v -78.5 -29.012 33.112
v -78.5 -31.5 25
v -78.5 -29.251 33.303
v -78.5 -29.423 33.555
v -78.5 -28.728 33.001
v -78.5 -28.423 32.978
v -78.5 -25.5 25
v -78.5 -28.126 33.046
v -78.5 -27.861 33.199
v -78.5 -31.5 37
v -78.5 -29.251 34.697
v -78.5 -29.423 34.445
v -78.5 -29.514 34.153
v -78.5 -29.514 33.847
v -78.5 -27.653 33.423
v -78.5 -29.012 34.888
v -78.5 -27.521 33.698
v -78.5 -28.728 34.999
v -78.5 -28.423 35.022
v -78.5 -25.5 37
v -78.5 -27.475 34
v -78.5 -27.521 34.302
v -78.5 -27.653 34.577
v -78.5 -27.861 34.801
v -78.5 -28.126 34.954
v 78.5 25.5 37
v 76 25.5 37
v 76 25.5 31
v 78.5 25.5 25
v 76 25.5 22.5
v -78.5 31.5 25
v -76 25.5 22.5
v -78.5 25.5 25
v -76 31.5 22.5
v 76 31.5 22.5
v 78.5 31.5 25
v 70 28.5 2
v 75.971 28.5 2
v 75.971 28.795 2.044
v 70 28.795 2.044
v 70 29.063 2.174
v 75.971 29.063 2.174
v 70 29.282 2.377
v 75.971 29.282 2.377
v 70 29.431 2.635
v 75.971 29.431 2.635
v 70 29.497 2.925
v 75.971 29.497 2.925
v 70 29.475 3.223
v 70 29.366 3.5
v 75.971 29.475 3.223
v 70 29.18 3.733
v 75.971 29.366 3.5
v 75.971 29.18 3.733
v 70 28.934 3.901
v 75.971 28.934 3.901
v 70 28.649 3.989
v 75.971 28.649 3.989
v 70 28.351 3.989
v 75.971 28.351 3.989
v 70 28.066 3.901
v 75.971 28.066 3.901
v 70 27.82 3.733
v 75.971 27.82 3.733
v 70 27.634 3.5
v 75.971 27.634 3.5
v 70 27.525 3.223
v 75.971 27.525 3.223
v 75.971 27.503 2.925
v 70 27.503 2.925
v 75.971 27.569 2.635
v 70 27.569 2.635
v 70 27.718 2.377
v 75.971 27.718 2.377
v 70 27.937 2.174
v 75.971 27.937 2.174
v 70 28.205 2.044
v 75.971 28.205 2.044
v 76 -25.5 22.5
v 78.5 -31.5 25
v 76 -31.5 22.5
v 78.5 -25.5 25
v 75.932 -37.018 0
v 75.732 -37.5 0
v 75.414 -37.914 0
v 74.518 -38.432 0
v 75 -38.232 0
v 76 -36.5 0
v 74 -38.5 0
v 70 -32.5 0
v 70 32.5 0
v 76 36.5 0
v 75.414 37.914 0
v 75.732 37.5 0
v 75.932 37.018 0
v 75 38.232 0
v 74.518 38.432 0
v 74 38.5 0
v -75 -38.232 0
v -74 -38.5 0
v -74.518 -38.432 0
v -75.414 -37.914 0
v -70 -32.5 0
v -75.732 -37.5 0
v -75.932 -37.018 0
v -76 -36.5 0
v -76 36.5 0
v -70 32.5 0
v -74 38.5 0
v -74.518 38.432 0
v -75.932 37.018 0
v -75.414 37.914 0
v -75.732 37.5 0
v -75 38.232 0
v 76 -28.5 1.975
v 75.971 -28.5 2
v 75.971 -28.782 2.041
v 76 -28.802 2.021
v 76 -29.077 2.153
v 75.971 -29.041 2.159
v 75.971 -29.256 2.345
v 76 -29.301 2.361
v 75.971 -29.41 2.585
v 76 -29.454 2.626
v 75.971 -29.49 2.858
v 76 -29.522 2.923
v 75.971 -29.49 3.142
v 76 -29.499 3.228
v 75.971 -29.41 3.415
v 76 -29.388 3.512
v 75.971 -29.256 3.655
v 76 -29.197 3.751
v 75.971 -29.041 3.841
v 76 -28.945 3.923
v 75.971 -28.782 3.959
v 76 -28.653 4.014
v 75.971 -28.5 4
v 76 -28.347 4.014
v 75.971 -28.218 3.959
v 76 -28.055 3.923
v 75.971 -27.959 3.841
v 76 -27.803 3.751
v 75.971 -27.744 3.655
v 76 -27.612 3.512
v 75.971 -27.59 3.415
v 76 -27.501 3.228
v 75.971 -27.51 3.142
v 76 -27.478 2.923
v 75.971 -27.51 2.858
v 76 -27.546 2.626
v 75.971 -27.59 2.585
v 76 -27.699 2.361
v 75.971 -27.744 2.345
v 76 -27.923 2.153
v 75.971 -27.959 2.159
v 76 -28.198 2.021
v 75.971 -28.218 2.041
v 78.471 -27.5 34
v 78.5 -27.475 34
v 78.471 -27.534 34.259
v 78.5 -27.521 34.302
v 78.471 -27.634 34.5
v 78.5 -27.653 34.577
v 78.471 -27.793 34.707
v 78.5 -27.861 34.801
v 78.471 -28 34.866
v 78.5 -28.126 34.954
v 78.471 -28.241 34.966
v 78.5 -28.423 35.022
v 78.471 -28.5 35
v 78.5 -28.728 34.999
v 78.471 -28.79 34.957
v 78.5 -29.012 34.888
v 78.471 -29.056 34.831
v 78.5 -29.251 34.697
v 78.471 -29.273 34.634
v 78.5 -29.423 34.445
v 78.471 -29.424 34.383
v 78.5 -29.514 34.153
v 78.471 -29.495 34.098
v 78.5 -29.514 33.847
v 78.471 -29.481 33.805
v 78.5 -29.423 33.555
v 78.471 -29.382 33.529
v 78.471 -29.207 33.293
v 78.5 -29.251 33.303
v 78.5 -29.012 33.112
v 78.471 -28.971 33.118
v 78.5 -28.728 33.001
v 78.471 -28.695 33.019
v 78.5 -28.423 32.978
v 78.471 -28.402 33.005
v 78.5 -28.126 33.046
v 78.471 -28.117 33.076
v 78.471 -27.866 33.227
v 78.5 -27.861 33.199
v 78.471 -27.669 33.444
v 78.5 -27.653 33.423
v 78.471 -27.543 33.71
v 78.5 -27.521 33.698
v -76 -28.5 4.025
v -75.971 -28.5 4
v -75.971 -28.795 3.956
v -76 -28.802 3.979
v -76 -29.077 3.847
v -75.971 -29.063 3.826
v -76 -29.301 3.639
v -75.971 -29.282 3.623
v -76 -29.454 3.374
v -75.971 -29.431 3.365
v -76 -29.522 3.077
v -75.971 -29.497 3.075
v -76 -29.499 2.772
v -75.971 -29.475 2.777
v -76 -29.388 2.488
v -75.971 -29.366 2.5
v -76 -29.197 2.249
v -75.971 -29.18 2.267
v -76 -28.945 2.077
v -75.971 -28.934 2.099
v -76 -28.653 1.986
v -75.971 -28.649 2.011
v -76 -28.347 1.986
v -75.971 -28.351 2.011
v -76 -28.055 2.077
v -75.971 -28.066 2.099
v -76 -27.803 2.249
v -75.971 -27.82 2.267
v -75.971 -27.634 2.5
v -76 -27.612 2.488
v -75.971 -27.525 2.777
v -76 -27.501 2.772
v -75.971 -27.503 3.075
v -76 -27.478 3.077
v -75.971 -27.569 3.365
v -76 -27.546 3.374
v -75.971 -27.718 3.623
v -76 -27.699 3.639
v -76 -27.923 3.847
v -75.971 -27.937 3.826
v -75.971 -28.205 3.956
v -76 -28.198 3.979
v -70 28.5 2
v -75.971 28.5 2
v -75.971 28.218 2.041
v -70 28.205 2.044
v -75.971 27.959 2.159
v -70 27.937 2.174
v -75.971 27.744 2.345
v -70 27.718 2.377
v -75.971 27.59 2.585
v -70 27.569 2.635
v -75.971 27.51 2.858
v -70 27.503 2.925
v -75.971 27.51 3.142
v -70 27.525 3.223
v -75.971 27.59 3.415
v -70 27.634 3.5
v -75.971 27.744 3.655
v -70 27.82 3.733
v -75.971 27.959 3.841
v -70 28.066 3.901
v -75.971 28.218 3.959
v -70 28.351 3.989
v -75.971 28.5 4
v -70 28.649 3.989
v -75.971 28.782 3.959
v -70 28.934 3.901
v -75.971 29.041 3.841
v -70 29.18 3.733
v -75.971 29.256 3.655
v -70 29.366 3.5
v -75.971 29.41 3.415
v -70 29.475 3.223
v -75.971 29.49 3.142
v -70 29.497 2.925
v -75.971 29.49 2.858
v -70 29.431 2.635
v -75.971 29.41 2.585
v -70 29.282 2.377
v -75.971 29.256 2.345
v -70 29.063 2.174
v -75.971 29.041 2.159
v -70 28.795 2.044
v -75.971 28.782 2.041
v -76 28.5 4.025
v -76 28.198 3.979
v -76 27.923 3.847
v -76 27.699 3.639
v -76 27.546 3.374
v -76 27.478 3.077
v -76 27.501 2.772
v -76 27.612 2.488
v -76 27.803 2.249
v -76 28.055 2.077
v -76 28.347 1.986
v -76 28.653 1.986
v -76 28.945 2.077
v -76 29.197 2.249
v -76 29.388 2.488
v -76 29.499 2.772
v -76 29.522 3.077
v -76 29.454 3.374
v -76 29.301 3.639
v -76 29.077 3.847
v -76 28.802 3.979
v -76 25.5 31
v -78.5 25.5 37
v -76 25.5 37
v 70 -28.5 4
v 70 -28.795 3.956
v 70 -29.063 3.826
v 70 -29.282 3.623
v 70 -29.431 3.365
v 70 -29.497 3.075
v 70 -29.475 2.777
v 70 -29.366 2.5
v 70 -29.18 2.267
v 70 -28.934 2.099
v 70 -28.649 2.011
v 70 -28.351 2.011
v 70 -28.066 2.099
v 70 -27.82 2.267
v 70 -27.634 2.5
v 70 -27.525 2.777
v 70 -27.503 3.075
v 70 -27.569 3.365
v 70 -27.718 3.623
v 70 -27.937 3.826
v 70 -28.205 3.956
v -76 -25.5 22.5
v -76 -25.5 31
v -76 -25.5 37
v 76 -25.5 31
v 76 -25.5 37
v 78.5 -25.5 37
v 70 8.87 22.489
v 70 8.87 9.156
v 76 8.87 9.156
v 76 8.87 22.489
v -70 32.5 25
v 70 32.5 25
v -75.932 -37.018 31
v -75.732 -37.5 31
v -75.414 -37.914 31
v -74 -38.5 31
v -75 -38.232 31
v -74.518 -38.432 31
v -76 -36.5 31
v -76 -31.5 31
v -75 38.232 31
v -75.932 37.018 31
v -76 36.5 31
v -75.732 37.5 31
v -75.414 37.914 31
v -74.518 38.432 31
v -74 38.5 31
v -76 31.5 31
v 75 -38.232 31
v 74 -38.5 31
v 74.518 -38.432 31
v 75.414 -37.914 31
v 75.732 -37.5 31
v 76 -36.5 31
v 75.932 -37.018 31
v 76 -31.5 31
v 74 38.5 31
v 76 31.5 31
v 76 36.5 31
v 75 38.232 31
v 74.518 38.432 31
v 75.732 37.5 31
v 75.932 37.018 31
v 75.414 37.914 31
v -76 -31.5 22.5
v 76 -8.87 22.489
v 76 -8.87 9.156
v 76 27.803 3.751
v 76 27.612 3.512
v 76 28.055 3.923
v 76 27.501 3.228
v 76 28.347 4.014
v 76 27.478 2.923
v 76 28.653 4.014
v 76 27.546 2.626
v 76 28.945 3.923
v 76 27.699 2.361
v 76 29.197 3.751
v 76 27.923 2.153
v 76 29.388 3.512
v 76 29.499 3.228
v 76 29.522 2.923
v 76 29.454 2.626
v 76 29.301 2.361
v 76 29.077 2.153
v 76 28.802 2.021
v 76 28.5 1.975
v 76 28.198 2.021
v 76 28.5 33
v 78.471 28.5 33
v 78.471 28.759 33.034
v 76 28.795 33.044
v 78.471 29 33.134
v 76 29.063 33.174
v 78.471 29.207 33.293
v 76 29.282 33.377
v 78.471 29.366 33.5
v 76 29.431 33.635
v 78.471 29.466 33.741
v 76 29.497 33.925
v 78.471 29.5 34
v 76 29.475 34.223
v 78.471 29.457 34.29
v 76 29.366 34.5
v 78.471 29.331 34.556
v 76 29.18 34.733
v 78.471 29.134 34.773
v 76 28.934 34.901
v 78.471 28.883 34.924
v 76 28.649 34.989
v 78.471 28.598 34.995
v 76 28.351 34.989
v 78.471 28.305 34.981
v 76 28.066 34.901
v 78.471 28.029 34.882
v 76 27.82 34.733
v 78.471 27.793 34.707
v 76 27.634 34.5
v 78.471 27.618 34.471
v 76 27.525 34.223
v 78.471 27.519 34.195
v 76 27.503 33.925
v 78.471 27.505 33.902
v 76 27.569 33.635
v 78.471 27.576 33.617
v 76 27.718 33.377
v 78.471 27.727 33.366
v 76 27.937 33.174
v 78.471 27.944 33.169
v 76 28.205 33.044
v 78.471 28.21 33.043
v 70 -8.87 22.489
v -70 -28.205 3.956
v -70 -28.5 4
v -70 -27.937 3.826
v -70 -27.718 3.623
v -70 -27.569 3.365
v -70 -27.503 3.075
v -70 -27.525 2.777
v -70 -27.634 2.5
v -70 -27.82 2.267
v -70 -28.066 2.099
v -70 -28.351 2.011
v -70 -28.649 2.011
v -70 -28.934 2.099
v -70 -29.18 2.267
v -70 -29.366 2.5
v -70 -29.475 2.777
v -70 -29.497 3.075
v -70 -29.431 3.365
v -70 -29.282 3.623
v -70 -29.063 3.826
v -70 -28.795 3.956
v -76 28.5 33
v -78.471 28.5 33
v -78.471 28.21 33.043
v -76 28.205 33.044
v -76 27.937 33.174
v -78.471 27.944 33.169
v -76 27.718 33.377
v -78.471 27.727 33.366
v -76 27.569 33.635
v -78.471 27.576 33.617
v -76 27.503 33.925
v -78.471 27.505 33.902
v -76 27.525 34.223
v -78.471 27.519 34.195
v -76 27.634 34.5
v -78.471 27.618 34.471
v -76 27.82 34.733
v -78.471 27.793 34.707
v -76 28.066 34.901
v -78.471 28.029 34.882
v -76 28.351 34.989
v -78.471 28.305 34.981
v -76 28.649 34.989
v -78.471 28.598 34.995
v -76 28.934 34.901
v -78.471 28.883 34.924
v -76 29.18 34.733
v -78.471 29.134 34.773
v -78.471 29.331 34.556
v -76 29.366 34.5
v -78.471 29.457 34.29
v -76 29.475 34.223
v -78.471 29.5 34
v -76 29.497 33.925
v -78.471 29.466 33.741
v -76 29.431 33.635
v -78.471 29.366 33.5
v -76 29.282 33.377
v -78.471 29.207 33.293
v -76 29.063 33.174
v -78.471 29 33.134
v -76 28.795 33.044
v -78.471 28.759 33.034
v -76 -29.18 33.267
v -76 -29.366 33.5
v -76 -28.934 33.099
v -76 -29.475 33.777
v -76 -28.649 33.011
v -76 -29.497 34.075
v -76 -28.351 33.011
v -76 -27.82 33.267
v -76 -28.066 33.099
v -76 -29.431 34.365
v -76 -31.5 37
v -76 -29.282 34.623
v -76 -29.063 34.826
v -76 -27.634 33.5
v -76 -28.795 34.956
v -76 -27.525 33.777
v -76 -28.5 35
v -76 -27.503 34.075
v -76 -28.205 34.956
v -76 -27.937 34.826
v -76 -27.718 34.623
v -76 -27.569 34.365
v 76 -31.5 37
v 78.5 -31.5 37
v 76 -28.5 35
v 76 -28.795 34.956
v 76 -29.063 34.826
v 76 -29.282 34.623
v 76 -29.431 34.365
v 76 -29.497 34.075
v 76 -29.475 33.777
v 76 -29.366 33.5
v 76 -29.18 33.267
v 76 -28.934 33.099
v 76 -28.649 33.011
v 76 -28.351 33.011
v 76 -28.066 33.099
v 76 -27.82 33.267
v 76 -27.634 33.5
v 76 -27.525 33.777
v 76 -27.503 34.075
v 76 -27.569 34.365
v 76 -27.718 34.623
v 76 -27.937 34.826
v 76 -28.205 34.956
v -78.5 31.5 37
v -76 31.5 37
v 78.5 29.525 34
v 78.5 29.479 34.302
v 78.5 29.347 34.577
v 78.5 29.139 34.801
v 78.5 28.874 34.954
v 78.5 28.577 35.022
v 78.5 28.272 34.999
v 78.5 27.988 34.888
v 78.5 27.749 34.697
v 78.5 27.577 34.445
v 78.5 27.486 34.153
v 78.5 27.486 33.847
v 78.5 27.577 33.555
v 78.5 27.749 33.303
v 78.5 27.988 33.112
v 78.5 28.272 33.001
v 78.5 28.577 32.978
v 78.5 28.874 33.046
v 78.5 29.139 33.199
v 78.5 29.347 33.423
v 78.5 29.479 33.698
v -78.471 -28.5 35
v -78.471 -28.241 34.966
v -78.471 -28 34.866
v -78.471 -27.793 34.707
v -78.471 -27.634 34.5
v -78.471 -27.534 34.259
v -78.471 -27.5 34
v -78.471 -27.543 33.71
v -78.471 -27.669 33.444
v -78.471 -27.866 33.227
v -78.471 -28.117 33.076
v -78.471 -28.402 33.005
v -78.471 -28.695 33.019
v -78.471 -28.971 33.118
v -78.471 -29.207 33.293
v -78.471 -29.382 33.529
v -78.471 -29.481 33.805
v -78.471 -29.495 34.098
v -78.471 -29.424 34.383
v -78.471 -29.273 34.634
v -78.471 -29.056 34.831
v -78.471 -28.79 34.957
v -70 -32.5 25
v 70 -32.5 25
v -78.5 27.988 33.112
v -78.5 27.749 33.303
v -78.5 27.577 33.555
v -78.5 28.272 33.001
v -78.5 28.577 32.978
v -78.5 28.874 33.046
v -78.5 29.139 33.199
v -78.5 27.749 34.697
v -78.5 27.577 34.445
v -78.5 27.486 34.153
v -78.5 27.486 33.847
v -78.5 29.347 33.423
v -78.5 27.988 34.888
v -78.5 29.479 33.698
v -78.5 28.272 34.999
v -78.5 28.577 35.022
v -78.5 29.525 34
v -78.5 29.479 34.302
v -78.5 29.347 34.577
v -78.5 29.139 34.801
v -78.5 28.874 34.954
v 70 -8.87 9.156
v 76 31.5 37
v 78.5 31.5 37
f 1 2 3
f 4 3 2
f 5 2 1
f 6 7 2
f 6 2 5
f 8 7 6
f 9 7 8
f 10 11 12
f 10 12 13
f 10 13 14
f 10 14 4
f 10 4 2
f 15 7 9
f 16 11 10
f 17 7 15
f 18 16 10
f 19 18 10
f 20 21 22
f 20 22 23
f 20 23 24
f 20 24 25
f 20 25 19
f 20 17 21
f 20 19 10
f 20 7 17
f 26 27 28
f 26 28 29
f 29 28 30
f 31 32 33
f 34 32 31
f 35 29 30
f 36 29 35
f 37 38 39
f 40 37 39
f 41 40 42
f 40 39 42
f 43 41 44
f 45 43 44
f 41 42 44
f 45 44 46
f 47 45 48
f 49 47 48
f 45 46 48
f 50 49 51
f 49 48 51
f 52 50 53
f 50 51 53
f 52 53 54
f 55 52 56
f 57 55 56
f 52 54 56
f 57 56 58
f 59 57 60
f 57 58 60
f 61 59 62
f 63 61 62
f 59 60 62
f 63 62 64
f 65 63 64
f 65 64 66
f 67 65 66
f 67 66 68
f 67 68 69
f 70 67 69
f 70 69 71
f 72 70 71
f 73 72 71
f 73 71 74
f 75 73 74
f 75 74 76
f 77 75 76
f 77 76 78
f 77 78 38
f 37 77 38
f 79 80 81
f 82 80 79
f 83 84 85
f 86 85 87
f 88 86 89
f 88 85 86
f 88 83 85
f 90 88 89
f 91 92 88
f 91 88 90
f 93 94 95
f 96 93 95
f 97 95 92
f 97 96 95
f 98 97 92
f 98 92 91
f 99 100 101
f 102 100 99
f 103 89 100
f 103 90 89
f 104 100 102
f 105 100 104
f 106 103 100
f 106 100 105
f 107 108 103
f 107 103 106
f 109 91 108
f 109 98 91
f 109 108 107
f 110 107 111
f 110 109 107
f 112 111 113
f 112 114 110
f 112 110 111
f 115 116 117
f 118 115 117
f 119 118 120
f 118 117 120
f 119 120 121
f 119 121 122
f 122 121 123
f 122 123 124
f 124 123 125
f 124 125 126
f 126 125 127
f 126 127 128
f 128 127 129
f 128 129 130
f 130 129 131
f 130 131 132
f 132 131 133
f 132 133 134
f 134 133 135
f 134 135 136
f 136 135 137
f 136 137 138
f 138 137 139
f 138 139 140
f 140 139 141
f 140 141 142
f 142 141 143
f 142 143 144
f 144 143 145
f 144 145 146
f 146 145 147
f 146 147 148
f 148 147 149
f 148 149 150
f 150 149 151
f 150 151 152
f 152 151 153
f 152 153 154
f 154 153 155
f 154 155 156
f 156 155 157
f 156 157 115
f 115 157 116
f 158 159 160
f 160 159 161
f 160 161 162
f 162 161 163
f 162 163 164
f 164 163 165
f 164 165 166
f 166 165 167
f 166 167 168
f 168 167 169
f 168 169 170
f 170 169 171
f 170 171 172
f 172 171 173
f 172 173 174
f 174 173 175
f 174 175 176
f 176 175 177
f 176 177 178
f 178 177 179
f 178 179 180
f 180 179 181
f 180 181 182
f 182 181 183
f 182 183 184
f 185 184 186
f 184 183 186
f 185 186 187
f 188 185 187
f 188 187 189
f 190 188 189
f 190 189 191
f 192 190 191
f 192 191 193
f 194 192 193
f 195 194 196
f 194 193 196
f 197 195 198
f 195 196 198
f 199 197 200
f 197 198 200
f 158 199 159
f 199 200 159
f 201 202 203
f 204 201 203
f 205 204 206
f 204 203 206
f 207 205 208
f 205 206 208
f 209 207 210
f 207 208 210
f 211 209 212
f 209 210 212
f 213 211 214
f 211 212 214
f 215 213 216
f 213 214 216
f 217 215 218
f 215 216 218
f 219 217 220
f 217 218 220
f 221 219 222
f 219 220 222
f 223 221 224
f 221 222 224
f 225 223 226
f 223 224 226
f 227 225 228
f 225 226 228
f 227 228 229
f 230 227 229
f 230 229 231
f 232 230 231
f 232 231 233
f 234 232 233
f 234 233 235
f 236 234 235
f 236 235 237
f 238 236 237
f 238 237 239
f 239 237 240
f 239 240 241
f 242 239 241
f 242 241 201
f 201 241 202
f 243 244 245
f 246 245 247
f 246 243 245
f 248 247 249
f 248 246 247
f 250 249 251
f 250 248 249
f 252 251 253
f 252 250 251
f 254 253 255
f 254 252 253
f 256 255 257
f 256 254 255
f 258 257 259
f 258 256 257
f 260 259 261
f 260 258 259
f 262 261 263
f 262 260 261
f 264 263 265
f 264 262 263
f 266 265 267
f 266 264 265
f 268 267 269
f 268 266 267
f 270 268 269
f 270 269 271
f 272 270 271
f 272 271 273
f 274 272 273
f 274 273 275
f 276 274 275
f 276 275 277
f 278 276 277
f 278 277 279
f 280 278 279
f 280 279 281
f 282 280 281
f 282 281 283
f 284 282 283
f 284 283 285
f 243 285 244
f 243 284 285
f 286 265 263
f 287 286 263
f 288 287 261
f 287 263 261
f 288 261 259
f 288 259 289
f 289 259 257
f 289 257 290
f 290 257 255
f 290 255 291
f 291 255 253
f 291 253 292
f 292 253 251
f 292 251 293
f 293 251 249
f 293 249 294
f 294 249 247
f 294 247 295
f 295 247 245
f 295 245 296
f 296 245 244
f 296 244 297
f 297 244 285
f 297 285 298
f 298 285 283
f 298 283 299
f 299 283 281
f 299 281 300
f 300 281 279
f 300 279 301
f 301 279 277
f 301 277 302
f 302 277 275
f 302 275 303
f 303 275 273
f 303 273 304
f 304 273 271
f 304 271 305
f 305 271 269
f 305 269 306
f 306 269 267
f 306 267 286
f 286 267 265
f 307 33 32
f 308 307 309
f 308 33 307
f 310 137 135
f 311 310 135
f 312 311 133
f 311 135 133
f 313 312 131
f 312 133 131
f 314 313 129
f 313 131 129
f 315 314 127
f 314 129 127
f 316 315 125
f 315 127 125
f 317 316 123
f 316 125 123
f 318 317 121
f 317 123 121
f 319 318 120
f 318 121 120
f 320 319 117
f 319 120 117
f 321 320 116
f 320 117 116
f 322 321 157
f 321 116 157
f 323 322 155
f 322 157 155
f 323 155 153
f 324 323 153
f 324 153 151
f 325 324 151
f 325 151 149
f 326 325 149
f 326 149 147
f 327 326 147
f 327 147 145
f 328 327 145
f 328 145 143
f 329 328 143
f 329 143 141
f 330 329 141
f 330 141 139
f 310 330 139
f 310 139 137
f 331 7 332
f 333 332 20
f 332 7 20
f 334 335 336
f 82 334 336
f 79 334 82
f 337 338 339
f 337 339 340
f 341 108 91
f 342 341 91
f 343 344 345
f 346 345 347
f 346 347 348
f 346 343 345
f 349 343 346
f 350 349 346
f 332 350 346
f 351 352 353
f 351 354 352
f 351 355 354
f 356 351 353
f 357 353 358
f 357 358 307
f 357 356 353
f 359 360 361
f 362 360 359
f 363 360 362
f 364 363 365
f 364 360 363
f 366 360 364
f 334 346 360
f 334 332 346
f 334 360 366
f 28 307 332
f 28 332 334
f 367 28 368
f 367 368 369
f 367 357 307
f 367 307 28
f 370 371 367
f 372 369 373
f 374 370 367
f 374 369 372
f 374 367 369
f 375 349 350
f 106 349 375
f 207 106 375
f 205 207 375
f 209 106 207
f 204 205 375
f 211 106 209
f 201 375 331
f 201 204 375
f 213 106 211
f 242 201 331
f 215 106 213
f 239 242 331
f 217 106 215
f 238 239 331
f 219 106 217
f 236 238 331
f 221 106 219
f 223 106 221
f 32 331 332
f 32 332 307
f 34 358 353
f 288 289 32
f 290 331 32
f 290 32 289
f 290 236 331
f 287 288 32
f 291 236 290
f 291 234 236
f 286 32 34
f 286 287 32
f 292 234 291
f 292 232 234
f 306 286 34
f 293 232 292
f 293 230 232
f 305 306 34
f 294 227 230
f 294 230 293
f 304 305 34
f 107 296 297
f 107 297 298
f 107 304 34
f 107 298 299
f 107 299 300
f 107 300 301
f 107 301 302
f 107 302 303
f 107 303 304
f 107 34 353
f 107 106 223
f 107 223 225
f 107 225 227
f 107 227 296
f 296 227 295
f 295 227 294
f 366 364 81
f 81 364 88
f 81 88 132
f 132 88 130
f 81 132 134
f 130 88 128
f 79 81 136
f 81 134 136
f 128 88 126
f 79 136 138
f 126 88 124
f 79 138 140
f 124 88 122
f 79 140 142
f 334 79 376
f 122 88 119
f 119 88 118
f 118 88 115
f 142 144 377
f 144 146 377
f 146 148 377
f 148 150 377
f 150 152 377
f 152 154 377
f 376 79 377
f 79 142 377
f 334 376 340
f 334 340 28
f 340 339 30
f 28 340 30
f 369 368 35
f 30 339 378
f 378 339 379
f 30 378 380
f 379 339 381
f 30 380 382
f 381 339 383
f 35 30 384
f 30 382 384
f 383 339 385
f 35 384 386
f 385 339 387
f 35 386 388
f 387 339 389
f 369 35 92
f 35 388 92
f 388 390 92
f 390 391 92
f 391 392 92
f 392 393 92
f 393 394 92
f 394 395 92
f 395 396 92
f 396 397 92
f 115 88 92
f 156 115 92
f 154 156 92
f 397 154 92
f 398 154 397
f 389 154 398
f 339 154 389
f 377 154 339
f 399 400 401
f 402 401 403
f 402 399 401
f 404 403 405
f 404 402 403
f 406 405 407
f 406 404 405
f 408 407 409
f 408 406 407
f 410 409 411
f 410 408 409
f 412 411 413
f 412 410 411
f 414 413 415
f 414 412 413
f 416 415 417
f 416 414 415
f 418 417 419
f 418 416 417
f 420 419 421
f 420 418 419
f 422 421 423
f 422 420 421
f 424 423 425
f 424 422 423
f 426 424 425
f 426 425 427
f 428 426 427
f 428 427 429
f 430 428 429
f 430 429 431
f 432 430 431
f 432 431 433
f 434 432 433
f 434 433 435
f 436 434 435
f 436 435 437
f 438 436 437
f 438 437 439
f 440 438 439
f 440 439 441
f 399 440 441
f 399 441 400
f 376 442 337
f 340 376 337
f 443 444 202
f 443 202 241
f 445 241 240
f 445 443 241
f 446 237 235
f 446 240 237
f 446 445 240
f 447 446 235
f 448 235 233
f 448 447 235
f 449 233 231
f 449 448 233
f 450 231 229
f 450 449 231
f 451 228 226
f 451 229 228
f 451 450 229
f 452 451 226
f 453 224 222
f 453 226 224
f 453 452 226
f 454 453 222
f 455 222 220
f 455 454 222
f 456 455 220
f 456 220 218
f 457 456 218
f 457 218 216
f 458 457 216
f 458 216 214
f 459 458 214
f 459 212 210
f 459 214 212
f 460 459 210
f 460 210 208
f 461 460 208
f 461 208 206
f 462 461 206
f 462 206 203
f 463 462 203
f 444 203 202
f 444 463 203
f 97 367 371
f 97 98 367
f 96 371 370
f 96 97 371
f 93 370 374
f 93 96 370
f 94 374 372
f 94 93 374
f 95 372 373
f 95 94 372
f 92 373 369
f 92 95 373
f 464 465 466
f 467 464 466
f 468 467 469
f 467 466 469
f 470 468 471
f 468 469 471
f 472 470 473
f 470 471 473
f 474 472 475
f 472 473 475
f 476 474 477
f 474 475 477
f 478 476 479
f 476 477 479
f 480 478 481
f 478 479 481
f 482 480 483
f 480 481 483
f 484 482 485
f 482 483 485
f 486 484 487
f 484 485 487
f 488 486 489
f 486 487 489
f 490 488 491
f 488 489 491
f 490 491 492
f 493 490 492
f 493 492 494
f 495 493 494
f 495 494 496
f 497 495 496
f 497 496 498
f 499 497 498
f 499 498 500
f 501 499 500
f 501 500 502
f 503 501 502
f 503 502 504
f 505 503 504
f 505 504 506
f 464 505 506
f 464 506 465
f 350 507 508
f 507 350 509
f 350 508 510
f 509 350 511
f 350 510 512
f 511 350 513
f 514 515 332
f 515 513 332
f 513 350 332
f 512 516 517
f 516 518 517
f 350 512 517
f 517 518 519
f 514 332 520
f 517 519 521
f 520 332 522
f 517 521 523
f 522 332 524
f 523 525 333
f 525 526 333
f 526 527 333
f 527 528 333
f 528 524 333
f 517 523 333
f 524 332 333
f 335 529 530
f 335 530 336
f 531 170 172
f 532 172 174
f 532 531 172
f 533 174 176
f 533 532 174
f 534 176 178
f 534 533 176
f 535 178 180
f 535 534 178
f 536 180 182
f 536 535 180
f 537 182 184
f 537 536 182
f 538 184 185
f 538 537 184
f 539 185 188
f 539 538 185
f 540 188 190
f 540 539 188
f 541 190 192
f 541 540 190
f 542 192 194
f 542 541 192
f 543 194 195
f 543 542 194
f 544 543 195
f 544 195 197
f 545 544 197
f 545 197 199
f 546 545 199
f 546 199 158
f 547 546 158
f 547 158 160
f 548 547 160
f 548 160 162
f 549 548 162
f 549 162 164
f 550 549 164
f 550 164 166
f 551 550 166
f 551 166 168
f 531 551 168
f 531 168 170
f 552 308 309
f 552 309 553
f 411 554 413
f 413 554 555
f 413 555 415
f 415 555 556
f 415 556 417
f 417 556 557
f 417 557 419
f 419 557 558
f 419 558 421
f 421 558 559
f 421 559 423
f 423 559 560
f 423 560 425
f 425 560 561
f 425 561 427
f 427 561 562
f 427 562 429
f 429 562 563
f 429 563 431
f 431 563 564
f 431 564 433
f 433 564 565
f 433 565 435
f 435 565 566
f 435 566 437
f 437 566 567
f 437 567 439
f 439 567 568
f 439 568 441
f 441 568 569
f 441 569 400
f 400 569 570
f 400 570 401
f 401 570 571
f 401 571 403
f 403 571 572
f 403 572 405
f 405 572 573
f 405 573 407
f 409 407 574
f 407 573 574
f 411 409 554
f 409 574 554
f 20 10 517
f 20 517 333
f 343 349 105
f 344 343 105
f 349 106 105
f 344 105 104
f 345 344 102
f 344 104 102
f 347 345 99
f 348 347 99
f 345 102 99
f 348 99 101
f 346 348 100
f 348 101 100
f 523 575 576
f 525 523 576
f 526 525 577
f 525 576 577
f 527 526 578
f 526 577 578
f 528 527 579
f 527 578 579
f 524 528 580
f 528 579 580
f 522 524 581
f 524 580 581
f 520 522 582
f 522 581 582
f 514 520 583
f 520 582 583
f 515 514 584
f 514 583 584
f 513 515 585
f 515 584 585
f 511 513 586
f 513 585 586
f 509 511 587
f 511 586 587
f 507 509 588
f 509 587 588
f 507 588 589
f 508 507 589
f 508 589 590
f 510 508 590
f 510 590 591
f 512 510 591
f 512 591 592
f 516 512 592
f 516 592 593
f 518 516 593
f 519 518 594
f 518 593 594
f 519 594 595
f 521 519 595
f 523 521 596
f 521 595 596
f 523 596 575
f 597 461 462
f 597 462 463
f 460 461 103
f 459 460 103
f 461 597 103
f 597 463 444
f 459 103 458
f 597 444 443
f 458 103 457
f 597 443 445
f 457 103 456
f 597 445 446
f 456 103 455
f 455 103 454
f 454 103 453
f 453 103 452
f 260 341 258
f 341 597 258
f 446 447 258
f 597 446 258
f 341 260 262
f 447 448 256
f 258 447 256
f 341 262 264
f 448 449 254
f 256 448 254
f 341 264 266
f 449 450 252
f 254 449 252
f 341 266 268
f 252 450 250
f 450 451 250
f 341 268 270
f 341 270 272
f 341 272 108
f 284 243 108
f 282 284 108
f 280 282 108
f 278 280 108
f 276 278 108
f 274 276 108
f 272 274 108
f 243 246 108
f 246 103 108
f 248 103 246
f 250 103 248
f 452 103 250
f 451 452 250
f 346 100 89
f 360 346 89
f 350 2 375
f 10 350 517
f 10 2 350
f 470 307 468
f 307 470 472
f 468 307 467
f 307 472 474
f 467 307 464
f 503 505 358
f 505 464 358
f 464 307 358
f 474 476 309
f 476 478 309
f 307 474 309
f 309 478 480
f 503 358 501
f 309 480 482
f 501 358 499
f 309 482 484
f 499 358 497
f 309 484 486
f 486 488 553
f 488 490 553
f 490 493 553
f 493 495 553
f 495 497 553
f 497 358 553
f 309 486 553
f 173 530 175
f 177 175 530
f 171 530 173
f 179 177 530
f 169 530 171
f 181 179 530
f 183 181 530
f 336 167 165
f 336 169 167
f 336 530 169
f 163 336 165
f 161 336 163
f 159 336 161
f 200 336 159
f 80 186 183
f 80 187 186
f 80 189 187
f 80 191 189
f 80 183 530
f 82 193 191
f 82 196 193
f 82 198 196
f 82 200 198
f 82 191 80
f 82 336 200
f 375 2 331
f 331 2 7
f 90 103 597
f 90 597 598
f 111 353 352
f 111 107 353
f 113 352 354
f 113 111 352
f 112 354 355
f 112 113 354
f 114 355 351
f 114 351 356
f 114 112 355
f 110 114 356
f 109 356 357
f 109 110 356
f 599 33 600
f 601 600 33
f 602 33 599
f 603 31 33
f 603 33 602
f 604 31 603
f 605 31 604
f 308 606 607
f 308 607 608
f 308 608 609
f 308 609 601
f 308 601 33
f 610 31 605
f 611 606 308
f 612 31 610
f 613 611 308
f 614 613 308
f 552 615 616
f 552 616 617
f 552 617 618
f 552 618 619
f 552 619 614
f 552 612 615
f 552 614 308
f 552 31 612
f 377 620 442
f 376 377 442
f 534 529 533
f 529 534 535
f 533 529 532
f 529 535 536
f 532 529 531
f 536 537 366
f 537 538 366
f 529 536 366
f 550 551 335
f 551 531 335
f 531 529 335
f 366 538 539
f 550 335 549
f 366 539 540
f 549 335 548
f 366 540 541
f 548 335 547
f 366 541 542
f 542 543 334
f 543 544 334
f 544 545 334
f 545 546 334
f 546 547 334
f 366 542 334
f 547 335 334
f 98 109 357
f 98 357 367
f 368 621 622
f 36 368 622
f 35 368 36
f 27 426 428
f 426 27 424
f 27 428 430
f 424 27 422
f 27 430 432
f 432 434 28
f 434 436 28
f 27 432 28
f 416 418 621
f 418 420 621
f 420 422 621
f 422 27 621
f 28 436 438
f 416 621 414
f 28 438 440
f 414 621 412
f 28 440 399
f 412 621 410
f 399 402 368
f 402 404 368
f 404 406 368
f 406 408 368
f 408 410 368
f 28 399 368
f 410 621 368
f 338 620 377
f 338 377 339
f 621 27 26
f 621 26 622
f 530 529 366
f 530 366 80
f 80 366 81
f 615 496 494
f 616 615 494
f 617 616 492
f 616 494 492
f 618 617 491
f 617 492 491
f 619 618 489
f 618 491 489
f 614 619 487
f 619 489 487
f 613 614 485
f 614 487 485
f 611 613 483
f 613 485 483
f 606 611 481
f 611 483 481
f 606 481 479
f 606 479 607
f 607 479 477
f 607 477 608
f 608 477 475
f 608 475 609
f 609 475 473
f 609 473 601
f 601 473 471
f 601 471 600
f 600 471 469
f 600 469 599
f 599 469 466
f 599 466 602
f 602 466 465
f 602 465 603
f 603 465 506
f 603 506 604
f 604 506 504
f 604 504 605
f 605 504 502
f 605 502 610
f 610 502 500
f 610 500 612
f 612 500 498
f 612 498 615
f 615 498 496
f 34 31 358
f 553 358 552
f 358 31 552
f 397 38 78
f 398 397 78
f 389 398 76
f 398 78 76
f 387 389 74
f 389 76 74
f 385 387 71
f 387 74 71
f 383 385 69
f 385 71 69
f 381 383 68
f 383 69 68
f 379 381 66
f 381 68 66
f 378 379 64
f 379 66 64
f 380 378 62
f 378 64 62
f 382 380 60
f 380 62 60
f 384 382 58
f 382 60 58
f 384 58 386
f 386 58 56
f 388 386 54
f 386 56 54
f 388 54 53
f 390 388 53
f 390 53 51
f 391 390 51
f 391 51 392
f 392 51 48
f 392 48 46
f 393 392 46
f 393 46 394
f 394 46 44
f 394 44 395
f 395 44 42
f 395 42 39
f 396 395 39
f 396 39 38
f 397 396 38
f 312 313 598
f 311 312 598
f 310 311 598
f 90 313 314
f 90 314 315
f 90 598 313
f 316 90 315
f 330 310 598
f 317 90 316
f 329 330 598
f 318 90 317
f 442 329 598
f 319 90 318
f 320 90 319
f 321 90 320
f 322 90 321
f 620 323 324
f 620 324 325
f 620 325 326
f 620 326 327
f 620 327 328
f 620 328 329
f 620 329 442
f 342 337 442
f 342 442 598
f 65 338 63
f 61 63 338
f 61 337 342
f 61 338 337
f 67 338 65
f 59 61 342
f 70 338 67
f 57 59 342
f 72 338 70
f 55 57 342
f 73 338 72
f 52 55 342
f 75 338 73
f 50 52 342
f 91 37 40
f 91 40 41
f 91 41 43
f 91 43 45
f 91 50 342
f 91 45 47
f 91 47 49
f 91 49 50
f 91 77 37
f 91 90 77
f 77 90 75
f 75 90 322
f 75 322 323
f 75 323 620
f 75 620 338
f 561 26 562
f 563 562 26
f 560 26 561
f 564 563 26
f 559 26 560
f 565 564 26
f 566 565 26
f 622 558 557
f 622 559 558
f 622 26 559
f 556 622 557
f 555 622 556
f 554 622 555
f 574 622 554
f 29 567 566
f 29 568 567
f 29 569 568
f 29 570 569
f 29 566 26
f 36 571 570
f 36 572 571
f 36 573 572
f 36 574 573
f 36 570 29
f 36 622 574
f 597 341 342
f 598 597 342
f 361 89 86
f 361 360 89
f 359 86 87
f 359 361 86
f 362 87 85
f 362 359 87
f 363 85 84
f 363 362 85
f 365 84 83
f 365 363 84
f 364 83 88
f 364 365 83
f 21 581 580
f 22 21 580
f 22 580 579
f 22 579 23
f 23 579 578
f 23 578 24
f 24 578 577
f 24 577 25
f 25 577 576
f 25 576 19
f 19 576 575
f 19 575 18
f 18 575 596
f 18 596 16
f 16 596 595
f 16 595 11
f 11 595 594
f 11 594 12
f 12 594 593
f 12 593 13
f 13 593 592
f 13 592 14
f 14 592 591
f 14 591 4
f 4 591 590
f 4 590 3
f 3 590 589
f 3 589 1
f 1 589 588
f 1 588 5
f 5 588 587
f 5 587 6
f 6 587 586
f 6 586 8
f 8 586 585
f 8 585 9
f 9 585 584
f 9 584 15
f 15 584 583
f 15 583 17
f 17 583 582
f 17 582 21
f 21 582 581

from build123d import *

# Parameters (mm, degrees)
IZIM1_W                     = 140
IZIM1_H                     = 65
Y_KSEKLIK_EKSTR_ZYON1_DEPTH = 25
BO_ALTMA3_T                 = 6
IZIM2_R                     = 2.25
KES_EKSTR_ZYON1_DEPTH       = 25
IZIM3_W                     = 13.33242511
IZIM3_H                     = 17.74072696
KES_EKSTR_ZYON2_DEPTH       = 25
RADYUS1_R                   = 2
IZIM2_2_R                   = 2.25
Y_KSEKLIK_EKSTR_ZYON2_DEPTH = 56
IZIM4_W                     = 373.647540747
IZIM4_H                     = 192.392001967
KES_EKSTR_ZYON3_DEPTH       = 1
IZIM5_R                     = 2.25
KES_EKSTR_ZYON4_DEPTH       = 25
IZIM6_W                     = 175.161164464
IZIM6_H                     = 86.760539326
KES_EKSTR_ZYON5_DEPTH       = 37
IZIM7_R                     = 2.25
Y_KSEKLIK_EKSTR_ZYON3_DEPTH = 30
IZIM8_R                     = 1
KES_EKSTR_ZYON6_DEPTH       = 16
KES_EKSTR_ZYON7_START       = -16
IZIM9_R                     = 1
KES_EKSTR_ZYON7_DEPTH       = 16
M2_DI_LI_DELIK2_D           = 1.6
M2_DI_LI_DELIK2_CSINK_D     = 2.05
M2_DI_LI_DELIK2_CSINK_ANGLE = 82
M2_DI_LI_DELIK3_D           = 1.6
M2_DI_LI_DELIK3_CSINK_D     = 2.05
M2_DI_LI_DELIK3_CSINK_ANGLE = 82
IZIM16_W                    = 12
IZIM16_H                    = 6
IZIM16_R                    = 1
Y_KSEKLIK_EKSTR_ZYON4_DEPTH = 2.5
Y_KSEKLIK_EKSTR_ZYON5_START = 2.5
IZIM17_W                    = 12
IZIM17_H                    = 6
IZIM17_R                    = 1
Y_KSEKLIK_EKSTR_ZYON5_DEPTH = 2.5
PAH1_SIZE                   = 2.5


# Read off the part's stored shape, not the designer's step: M2 Dişli Delik4
with BuildPart() as part:
    # Çizim1 → Yükseklik-Ekstrüzyon1 (new body)
    with BuildSketch(Plane.XY):
        Rectangle(IZIM1_W, IZIM1_H)
    extrude(amount=Y_KSEKLIK_EKSTR_ZYON1_DEPTH)

    # İç Boşaltma3
    bo_altma3_openings = [part.faces().sort_by_distance(p)[0] for p in [
        (0, 0, 0),
    ]]
    offset(amount=BO_ALTMA3_T, openings=bo_altma3_openings, kind=Kind.INTERSECTION)

    # Çizim2 → Kes-Ekstrüzyon1 (cut)
    with BuildSketch(Plane(origin=(0, 0, 0), x_dir=(-1, 0, 0), z_dir=(0, 0, -1))):
        with Locations((-73, -35.5)):
            Circle(IZIM2_R)
        with Locations(Location((73, -35.5, 0), (0, 0, 180))):
            Circle(IZIM2_R)
        with Locations(Location((-73, 35.5, 0), (0, 0, 180))):
            Circle(IZIM2_R)
        with Locations((73, 35.5)):
            Circle(IZIM2_R)
    extrude(amount=-KES_EKSTR_ZYON1_DEPTH, mode=Mode.SUBTRACT)

    # Çizim3 → Kes-Ekstrüzyon2 (cut)
    with BuildSketch(Plane.ZY.offset(-70)):
        with Locations((15.822558672, 0)):
            Rectangle(IZIM3_W, IZIM3_H)
    extrude(amount=-KES_EKSTR_ZYON2_DEPTH, mode=Mode.SUBTRACT)

    # Radyus1
    radyus1_edges = [part.edges().sort_by_distance(p)[0] for p in [
        (76, -38.5, 15.5),
        (-76, -38.5, 15.5),
        (-76, 38.5, 15.5),
        (76, 38.5, 15.5),
    ]]
    fillet(radyus1_edges, radius=RADYUS1_R)

    # Çizim2<2> → Yükseklik-Ekstrüzyon2 (add)
    with BuildSketch(Plane(origin=(0, 0, 0), x_dir=(-1, 0, 0), z_dir=(0, 0, -1))):
        with Locations((-73, -35.5)):
            Circle(IZIM2_2_R)
        with Locations((73, -35.5)):
            Circle(IZIM2_2_R)
        with Locations((-73, 35.5)):
            Circle(IZIM2_2_R)
        with Locations((73, 35.5)):
            Circle(IZIM2_2_R)
    extrude(amount=-Y_KSEKLIK_EKSTR_ZYON2_DEPTH)

    # Çizim4 → Kes-Ekstrüzyon3 (cut)
    with BuildSketch(Plane.XY.offset(56)):
        with Locations((-92.221826013, 44.195860188)):
            Rectangle(IZIM4_W, IZIM4_H)
    extrude(amount=-KES_EKSTR_ZYON3_DEPTH, mode=Mode.SUBTRACT)

    # Çizim5 → Kes-Ekstrüzyon4 (cut)
    with BuildSketch(Plane(origin=(0, 0, 0), x_dir=(-1, 0, 0), z_dir=(0, 0, -1))):
        with Locations((-73, -35.527793561)):
            Circle(IZIM5_R)
        with Locations(Location((-73, 35.527793561, 0), (0, 0, 180))):
            Circle(IZIM5_R)
        with Locations((73, 35.527793561)):
            Circle(IZIM5_R)
        with Locations(Location((73, -35.527793561, 0), (0, 0, 180))):
            Circle(IZIM5_R)
    extrude(amount=-KES_EKSTR_ZYON4_DEPTH, mode=Mode.SUBTRACT)

    # Çizim6 → Kes-Ekstrüzyon5 (cut)
    with BuildSketch(Plane.XY.offset(31)):
        Rectangle(IZIM6_W, IZIM6_H)
    extrude(amount=KES_EKSTR_ZYON5_DEPTH, mode=Mode.SUBTRACT)

    # Çizim7 → Yükseklik-Ekstrüzyon3 (add)
    with BuildSketch(Plane(origin=(0, 0, 0), x_dir=(-1, 0, 0), z_dir=(0, 0, -1))):
        with Locations((-73, 35.527793561)):
            Circle(IZIM7_R)
        with Locations((-73, -35.527793561)):
            Circle(IZIM7_R)
        with Locations((73, -35.527793561)):
            Circle(IZIM7_R)
        with Locations((73, 35.527793561)):
            Circle(IZIM7_R)
    extrude(amount=-Y_KSEKLIK_EKSTR_ZYON3_DEPTH)

    # Çizim8 → Kes-Ekstrüzyon6 (cut)
    with BuildSketch(Plane(origin=(76, 0, 0), x_dir=(0, 0, -1), z_dir=(1, 0, 0))):
        with Locations((-3, 28.5)):
            Circle(IZIM8_R)
        with Locations(Location((-3, -28.5, 0), (0, 0, 180))):
            Circle(IZIM8_R)
    extrude(amount=-KES_EKSTR_ZYON6_DEPTH, mode=Mode.SUBTRACT)

    # Çizim9 → Kes-Ekstrüzyon7 (cut)
    with BuildSketch(Plane.ZY.offset(76).offset(KES_EKSTR_ZYON7_START)):
        with Locations(Location((3, 28.5, 0), (0, 0, 180))):
            Circle(IZIM9_R)
        with Locations((3, -28.5)):
            Circle(IZIM9_R)
    extrude(amount=KES_EKSTR_ZYON7_DEPTH, mode=Mode.SUBTRACT)

    # M2 Dişli Delik2 (through all)
    with Locations(Plane(origin=(-76, 28.5, 3), x_dir=(0, 0, -1), z_dir=(-1, 0, 0))):
        with Locations((0, 0), (0, 57)):
            CounterSinkHole(M2_DI_LI_DELIK2_D / 2, M2_DI_LI_DELIK2_CSINK_D / 2, counter_sink_angle=M2_DI_LI_DELIK2_CSINK_ANGLE)

    # M2 Dişli Delik3 (through all)
    with Locations(Plane(origin=(76, 28.5, 3), x_dir=(0, 0, 1), z_dir=(1, 0, 0))):
        with Locations((0, 0), (0, 57)):
            CounterSinkHole(M2_DI_LI_DELIK3_D / 2, M2_DI_LI_DELIK3_CSINK_D / 2, counter_sink_angle=M2_DI_LI_DELIK3_CSINK_ANGLE)

    # Çizim16 → Yükseklik-Ekstrüzyon4 (add)
    # profile 1 of 2: a face of its own
    with BuildSketch(Plane(origin=(76, 0, 0), x_dir=(0, 0, -1), z_dir=(1, 0, 0))):
        with Locations((-31, 28.5)):
            Rectangle(IZIM16_W, IZIM16_H)
        with Locations((-34, 28.5)):
            Circle(IZIM16_R, mode=Mode.SUBTRACT)
    # profile 2 of 2: a face of its own
    with BuildSketch(Plane(origin=(76, 0, 0), x_dir=(0, 0, -1), z_dir=(1, 0, 0))):
        with Locations((-31, -28.5)):
            Rectangle(IZIM16_W, IZIM16_H)
        with Locations(Location((-34, -28.5, 0), (0, 0, 180))):
            Circle(IZIM16_R, mode=Mode.SUBTRACT)
    extrude(amount=Y_KSEKLIK_EKSTR_ZYON4_DEPTH)

    # Çizim17 → Yükseklik-Ekstrüzyon5 (add)
    # profile 1 of 2: a face of its own
    with BuildSketch(Plane.ZY.offset(76).offset(Y_KSEKLIK_EKSTR_ZYON5_START)):
        with Locations((31, 28.5)):
            Rectangle(IZIM17_W, IZIM17_H)
        with Locations(Location((34, 28.5, 0), (0, 0, 180))):
            Circle(IZIM17_R, mode=Mode.SUBTRACT)
    # profile 2 of 2: a face of its own
    with BuildSketch(Plane.ZY.offset(76).offset(Y_KSEKLIK_EKSTR_ZYON5_START)):
        with Locations((31, -28.5)):
            Rectangle(IZIM17_W, IZIM17_H)
        with Locations((34, -28.5)):
            Circle(IZIM17_R, mode=Mode.SUBTRACT)
    extrude(amount=-Y_KSEKLIK_EKSTR_ZYON5_DEPTH)

    # M2 Dişli Delik4 outline → M2 Dişli Delik4 (revolve, cut)
    with BuildSketch(Plane(origin=(0, 28.5, 34), x_dir=(0, 1, 0), z_dir=(0, 0, -1))):
        Polygon((1, 78.5), (1, 78.47124079), (1.025, 78.5), align=None)
        Polygon((1.025, -78.5), (1, -78.47124079), (1, -78.5), align=None)
    revolve(axis=Axis((0, 28.5, 34), (1, 0, 0)), mode=Mode.SUBTRACT)

    # M2 Di_li Delik4 2 outline → M2 Di_li Delik4 2 (revolve, cut)
    with BuildSketch(Plane(origin=(0, -28.5, 34), x_dir=(0, 1, 0), z_dir=(0, 0, -1))):
        Polygon((1, 78.5), (1, 78.47124079), (1.025, 78.5), align=None)
        Polygon((1.025, -78.5), (1, -78.47124079), (1, -78.5), align=None)
    revolve(axis=Axis((0, -28.5, 34), (1, 0, 0)), mode=Mode.SUBTRACT)

    # Pah1
    pah1_edges = [part.edges().sort_by_distance(p)[0] for p in [
        (76, -28.5, 25),
        (76, 28.5, 25),
        (-76, 28.5, 25),
        (-76, -28.5, 25),
    ]]
    chamfer(pah1_edges, length=PAH1_SIZE - 0.0001)  # a hair under: the kernel refuses the full size


solid = part.part
